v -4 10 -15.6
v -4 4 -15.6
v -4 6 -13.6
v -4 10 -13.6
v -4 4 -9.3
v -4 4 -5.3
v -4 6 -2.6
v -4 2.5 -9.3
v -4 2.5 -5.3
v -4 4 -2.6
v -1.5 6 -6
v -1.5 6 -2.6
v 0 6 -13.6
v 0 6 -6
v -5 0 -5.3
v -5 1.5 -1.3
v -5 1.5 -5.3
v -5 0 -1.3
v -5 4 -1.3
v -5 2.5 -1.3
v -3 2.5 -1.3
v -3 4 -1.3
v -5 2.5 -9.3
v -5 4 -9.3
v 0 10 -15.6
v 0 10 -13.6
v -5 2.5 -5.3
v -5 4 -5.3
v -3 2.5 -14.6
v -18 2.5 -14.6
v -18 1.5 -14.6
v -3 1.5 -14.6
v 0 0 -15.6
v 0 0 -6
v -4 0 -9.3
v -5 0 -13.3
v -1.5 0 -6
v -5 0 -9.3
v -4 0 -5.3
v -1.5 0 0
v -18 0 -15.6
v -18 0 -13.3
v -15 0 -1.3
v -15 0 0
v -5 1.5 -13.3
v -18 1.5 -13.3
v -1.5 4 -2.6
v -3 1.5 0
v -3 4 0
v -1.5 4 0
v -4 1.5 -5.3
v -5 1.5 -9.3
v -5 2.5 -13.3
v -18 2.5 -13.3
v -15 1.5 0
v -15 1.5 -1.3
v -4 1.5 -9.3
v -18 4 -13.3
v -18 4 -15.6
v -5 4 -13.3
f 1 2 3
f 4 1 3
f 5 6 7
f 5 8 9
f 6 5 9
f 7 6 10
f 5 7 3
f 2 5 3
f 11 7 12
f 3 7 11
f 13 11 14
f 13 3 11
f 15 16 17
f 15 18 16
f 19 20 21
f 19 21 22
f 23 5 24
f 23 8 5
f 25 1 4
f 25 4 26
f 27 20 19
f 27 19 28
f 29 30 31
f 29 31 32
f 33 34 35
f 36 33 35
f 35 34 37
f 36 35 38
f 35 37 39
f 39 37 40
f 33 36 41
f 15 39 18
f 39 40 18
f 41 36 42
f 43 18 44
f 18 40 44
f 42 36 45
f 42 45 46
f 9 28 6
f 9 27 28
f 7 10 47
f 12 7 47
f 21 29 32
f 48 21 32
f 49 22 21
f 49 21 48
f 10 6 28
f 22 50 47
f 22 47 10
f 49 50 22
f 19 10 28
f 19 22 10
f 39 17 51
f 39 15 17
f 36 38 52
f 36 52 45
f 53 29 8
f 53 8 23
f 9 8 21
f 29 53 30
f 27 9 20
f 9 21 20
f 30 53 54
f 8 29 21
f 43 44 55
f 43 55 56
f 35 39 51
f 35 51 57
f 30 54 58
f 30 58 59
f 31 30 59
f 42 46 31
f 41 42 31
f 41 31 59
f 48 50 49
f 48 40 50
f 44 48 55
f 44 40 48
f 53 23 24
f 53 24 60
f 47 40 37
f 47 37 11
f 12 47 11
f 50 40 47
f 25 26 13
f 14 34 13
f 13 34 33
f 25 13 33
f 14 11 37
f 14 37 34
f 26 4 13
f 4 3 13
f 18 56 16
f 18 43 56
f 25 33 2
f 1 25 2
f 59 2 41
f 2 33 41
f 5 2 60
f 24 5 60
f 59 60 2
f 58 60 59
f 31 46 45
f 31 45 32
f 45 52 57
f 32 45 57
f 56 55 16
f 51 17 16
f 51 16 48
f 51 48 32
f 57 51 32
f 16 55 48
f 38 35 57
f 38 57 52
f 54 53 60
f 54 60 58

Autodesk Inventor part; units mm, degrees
ref_plane "YZ Plane" through (0, 0, 0) normal (1, 0, 0) x (0, 1, 0)
ref_plane "XZ Plane" through (0, 0, 0) normal (0, 1, 0) x (-1, 0, 0)
ref_plane "XY Plane" through (0, 0, 0) normal (0, 0, 1) x (1, 0, 0)
sketch "스케치1" plane through (0, 0, 0) normal (0, 1, 0) x (-1, 0, 0)
  line L0 (0, 0) -> (0, -15.6)
  line L1 (0, -15.6) -> (18, -15.6)
  line L2 (0, 0) -> (15, 0)
  line L3 (15, 0) -> (15, -1.3)
  line L4 (15, -1.3) -> (5, -1.3)
  line L5 (5, -1.3) -> (5, -5.3)
  line L6 (5, -5.3) -> (4, -5.3)
  line L7 (4, -5.3) -> (4, -9.3)
  line L8 (4, -9.3) -> (5, -9.3)
  line L9 (5, -9.3) -> (5, -13.3)
  line L10 (5, -13.3) -> (18, -13.3)
  line L11 (18, -13.3) -> (18, -15.6)
  line L12 (3, 0) -> (19.1, 0) construction
  line L13 (19.1, 0) -> (19.1, -14.6) construction
  line L14 (19.1, -14.6) -> (3, -14.6) construction
  line L15 (3, -14.6) -> (3, 0) construction
  line L16 (19.1, -7.3) -> (3, -7.3) construction
  dimension "d0" = 15.6
  dimension "d1" = 18
  dimension "d2" = 15
  dimension "d3" = 1.3
  dimension "d4" = 10
  dimension "d5" = 4
  dimension "d6" = 1
  dimension "d7" = 4
  dimension "d8" = 1
  dimension "d9" = 4
  dimension "d10" = 13
  dimension "d18" = 16.1
  dimension "d19" = 14.6
  dimension "d20" = 3
  dimension "d21" = 1
extrude "돌출1" add sketch "스케치1" along normal blind 4
sketch "스케치2" plane through (-15, 0, 0) normal (0, 0, 1) x (1, 0, 0)
  line L0 (-3, 1.5) -> (12, 1.5)
  line L1 (12, 1.5) -> (12, 2.5)
  line L2 (12, 2.5) -> (-3, 2.5)
  line L3 (-3, 2.5) -> (-3, 1.5)
  line L4 (15, 0) -> (15, 4) projected
  line L5 (0, 0) -> (0, 4) projected
  line L6 (0, 0) -> (15, 0) projected
  line L7 (-3, 0) -> (-3, 4) projected
  dimension "d13" = 1
  dimension "d14" = 3
  dimension "d15" = 1.5
extrude "돌출2" cut sketch "스케치2" against normal blind 14.6
sketch "스케치3" plane through (0, 4, 0) normal (0, 1, 0) x (1, 0, 0)
  line L0 (0, 0) -> (0, 15.6) projected
  line L1 (0, 15.6) -> (-18, 15.6) projected
  line L2 (-18, 15.6) -> (-18, 13.3) projected
  line L3 (-18, 13.3) -> (-5, 13.3) projected
  line L4 (-5, 13.3) -> (-5, 9.3) projected
  line L5 (-5, 9.3) -> (-4, 9.3) projected
  line L6 (-4, 9.3) -> (-4, 5.3) projected
  line L7 (-4, 5.3) -> (-5, 5.3) projected
  line L8 (-5, 5.3) -> (-5, 1.3) projected
  line L9 (-5, 1.3) -> (-15, 1.3) projected
  line L10 (-15, 1.3) -> (-15, 0) projected
  line L11 (-15, 0) -> (0, 0) projected
  line L12 (0, 15.6) -> (-4, 15.6)
  line L13 (-4, 15.6) -> (-4, 2.6)
  line L14 (-4, 2.6) -> (0, 2.6)
  line L15 (0, 2.6) -> (0, 15.6)
  point P0 (0, 2.6)
  dimension "d37" = 4
  dimension "d38" = 13
extrude "돌출3" add sketch "스케치3" along normal blind 2 contours L14 L13 L6 L1 L0
sketch "스케치4" plane through (0, 6, 0) normal (0, 1, 0) x (1, 0, 0)
  line L0 (0, 2.6) -> (0, 15.6) projected
  line L1 (0, 15.6) -> (-4, 15.6) projected
  line L2 (-4, 15.6) -> (-4, 2.6) projected
  line L3 (-4, 2.6) -> (0, 2.6) projected
  line L4 (0, 15.6) -> (-4, 15.6)
  line L5 (-4, 15.6) -> (-4, 13.6)
  line L6 (-4, 13.6) -> (0, 13.6)
  line L7 (0, 13.6) -> (0, 15.6)
  point P0 (0, 13.6)
  dimension "d39" = 2
extrude "돌출4" add sketch "스케치4" along normal blind 4 contours L6 L2 L1 L0
sketch "스케치7" plane through (-15, 0, 0) normal (0, 0, 1) x (1, 0, 0)
  line L0 (12, 2.5) -> (12, 1.5) projected
  line L1 (0, 0) -> (15, 0) projected
  line L2 (15, 0) -> (15, 4) projected
  line L3 (15, 0) -> (13.5, 0)
  line L4 (13.5, 0) -> (13.5, 6)
  line L5 (13.5, 6) -> (15, 6)
  line L6 (15, 6) -> (15, 0)
  dimension "d34" = 1.5
  dimension "d41" = 6
extrude "돌출7" cut sketch "스케치7" against normal blind 6
sketch "스케치8" plane through (-15, 4, -1.3) normal (-1, 0, 0) x (0, 0, 1)
  line L0 (0, -1.5) -> (1.3, -1.5) projected
  line L1 (1.3, -1.5) -> (1.3, 0) projected
  line L2 (0, 0) -> (1.3, 0) projected
  line L3 (0, -1.5) -> (0, 0) projected
  point P0 (1.3, -4)
extrude "돌출8" cut sketch "스케치8" against normal blind 12
properties part number "_3D 인쇄"
